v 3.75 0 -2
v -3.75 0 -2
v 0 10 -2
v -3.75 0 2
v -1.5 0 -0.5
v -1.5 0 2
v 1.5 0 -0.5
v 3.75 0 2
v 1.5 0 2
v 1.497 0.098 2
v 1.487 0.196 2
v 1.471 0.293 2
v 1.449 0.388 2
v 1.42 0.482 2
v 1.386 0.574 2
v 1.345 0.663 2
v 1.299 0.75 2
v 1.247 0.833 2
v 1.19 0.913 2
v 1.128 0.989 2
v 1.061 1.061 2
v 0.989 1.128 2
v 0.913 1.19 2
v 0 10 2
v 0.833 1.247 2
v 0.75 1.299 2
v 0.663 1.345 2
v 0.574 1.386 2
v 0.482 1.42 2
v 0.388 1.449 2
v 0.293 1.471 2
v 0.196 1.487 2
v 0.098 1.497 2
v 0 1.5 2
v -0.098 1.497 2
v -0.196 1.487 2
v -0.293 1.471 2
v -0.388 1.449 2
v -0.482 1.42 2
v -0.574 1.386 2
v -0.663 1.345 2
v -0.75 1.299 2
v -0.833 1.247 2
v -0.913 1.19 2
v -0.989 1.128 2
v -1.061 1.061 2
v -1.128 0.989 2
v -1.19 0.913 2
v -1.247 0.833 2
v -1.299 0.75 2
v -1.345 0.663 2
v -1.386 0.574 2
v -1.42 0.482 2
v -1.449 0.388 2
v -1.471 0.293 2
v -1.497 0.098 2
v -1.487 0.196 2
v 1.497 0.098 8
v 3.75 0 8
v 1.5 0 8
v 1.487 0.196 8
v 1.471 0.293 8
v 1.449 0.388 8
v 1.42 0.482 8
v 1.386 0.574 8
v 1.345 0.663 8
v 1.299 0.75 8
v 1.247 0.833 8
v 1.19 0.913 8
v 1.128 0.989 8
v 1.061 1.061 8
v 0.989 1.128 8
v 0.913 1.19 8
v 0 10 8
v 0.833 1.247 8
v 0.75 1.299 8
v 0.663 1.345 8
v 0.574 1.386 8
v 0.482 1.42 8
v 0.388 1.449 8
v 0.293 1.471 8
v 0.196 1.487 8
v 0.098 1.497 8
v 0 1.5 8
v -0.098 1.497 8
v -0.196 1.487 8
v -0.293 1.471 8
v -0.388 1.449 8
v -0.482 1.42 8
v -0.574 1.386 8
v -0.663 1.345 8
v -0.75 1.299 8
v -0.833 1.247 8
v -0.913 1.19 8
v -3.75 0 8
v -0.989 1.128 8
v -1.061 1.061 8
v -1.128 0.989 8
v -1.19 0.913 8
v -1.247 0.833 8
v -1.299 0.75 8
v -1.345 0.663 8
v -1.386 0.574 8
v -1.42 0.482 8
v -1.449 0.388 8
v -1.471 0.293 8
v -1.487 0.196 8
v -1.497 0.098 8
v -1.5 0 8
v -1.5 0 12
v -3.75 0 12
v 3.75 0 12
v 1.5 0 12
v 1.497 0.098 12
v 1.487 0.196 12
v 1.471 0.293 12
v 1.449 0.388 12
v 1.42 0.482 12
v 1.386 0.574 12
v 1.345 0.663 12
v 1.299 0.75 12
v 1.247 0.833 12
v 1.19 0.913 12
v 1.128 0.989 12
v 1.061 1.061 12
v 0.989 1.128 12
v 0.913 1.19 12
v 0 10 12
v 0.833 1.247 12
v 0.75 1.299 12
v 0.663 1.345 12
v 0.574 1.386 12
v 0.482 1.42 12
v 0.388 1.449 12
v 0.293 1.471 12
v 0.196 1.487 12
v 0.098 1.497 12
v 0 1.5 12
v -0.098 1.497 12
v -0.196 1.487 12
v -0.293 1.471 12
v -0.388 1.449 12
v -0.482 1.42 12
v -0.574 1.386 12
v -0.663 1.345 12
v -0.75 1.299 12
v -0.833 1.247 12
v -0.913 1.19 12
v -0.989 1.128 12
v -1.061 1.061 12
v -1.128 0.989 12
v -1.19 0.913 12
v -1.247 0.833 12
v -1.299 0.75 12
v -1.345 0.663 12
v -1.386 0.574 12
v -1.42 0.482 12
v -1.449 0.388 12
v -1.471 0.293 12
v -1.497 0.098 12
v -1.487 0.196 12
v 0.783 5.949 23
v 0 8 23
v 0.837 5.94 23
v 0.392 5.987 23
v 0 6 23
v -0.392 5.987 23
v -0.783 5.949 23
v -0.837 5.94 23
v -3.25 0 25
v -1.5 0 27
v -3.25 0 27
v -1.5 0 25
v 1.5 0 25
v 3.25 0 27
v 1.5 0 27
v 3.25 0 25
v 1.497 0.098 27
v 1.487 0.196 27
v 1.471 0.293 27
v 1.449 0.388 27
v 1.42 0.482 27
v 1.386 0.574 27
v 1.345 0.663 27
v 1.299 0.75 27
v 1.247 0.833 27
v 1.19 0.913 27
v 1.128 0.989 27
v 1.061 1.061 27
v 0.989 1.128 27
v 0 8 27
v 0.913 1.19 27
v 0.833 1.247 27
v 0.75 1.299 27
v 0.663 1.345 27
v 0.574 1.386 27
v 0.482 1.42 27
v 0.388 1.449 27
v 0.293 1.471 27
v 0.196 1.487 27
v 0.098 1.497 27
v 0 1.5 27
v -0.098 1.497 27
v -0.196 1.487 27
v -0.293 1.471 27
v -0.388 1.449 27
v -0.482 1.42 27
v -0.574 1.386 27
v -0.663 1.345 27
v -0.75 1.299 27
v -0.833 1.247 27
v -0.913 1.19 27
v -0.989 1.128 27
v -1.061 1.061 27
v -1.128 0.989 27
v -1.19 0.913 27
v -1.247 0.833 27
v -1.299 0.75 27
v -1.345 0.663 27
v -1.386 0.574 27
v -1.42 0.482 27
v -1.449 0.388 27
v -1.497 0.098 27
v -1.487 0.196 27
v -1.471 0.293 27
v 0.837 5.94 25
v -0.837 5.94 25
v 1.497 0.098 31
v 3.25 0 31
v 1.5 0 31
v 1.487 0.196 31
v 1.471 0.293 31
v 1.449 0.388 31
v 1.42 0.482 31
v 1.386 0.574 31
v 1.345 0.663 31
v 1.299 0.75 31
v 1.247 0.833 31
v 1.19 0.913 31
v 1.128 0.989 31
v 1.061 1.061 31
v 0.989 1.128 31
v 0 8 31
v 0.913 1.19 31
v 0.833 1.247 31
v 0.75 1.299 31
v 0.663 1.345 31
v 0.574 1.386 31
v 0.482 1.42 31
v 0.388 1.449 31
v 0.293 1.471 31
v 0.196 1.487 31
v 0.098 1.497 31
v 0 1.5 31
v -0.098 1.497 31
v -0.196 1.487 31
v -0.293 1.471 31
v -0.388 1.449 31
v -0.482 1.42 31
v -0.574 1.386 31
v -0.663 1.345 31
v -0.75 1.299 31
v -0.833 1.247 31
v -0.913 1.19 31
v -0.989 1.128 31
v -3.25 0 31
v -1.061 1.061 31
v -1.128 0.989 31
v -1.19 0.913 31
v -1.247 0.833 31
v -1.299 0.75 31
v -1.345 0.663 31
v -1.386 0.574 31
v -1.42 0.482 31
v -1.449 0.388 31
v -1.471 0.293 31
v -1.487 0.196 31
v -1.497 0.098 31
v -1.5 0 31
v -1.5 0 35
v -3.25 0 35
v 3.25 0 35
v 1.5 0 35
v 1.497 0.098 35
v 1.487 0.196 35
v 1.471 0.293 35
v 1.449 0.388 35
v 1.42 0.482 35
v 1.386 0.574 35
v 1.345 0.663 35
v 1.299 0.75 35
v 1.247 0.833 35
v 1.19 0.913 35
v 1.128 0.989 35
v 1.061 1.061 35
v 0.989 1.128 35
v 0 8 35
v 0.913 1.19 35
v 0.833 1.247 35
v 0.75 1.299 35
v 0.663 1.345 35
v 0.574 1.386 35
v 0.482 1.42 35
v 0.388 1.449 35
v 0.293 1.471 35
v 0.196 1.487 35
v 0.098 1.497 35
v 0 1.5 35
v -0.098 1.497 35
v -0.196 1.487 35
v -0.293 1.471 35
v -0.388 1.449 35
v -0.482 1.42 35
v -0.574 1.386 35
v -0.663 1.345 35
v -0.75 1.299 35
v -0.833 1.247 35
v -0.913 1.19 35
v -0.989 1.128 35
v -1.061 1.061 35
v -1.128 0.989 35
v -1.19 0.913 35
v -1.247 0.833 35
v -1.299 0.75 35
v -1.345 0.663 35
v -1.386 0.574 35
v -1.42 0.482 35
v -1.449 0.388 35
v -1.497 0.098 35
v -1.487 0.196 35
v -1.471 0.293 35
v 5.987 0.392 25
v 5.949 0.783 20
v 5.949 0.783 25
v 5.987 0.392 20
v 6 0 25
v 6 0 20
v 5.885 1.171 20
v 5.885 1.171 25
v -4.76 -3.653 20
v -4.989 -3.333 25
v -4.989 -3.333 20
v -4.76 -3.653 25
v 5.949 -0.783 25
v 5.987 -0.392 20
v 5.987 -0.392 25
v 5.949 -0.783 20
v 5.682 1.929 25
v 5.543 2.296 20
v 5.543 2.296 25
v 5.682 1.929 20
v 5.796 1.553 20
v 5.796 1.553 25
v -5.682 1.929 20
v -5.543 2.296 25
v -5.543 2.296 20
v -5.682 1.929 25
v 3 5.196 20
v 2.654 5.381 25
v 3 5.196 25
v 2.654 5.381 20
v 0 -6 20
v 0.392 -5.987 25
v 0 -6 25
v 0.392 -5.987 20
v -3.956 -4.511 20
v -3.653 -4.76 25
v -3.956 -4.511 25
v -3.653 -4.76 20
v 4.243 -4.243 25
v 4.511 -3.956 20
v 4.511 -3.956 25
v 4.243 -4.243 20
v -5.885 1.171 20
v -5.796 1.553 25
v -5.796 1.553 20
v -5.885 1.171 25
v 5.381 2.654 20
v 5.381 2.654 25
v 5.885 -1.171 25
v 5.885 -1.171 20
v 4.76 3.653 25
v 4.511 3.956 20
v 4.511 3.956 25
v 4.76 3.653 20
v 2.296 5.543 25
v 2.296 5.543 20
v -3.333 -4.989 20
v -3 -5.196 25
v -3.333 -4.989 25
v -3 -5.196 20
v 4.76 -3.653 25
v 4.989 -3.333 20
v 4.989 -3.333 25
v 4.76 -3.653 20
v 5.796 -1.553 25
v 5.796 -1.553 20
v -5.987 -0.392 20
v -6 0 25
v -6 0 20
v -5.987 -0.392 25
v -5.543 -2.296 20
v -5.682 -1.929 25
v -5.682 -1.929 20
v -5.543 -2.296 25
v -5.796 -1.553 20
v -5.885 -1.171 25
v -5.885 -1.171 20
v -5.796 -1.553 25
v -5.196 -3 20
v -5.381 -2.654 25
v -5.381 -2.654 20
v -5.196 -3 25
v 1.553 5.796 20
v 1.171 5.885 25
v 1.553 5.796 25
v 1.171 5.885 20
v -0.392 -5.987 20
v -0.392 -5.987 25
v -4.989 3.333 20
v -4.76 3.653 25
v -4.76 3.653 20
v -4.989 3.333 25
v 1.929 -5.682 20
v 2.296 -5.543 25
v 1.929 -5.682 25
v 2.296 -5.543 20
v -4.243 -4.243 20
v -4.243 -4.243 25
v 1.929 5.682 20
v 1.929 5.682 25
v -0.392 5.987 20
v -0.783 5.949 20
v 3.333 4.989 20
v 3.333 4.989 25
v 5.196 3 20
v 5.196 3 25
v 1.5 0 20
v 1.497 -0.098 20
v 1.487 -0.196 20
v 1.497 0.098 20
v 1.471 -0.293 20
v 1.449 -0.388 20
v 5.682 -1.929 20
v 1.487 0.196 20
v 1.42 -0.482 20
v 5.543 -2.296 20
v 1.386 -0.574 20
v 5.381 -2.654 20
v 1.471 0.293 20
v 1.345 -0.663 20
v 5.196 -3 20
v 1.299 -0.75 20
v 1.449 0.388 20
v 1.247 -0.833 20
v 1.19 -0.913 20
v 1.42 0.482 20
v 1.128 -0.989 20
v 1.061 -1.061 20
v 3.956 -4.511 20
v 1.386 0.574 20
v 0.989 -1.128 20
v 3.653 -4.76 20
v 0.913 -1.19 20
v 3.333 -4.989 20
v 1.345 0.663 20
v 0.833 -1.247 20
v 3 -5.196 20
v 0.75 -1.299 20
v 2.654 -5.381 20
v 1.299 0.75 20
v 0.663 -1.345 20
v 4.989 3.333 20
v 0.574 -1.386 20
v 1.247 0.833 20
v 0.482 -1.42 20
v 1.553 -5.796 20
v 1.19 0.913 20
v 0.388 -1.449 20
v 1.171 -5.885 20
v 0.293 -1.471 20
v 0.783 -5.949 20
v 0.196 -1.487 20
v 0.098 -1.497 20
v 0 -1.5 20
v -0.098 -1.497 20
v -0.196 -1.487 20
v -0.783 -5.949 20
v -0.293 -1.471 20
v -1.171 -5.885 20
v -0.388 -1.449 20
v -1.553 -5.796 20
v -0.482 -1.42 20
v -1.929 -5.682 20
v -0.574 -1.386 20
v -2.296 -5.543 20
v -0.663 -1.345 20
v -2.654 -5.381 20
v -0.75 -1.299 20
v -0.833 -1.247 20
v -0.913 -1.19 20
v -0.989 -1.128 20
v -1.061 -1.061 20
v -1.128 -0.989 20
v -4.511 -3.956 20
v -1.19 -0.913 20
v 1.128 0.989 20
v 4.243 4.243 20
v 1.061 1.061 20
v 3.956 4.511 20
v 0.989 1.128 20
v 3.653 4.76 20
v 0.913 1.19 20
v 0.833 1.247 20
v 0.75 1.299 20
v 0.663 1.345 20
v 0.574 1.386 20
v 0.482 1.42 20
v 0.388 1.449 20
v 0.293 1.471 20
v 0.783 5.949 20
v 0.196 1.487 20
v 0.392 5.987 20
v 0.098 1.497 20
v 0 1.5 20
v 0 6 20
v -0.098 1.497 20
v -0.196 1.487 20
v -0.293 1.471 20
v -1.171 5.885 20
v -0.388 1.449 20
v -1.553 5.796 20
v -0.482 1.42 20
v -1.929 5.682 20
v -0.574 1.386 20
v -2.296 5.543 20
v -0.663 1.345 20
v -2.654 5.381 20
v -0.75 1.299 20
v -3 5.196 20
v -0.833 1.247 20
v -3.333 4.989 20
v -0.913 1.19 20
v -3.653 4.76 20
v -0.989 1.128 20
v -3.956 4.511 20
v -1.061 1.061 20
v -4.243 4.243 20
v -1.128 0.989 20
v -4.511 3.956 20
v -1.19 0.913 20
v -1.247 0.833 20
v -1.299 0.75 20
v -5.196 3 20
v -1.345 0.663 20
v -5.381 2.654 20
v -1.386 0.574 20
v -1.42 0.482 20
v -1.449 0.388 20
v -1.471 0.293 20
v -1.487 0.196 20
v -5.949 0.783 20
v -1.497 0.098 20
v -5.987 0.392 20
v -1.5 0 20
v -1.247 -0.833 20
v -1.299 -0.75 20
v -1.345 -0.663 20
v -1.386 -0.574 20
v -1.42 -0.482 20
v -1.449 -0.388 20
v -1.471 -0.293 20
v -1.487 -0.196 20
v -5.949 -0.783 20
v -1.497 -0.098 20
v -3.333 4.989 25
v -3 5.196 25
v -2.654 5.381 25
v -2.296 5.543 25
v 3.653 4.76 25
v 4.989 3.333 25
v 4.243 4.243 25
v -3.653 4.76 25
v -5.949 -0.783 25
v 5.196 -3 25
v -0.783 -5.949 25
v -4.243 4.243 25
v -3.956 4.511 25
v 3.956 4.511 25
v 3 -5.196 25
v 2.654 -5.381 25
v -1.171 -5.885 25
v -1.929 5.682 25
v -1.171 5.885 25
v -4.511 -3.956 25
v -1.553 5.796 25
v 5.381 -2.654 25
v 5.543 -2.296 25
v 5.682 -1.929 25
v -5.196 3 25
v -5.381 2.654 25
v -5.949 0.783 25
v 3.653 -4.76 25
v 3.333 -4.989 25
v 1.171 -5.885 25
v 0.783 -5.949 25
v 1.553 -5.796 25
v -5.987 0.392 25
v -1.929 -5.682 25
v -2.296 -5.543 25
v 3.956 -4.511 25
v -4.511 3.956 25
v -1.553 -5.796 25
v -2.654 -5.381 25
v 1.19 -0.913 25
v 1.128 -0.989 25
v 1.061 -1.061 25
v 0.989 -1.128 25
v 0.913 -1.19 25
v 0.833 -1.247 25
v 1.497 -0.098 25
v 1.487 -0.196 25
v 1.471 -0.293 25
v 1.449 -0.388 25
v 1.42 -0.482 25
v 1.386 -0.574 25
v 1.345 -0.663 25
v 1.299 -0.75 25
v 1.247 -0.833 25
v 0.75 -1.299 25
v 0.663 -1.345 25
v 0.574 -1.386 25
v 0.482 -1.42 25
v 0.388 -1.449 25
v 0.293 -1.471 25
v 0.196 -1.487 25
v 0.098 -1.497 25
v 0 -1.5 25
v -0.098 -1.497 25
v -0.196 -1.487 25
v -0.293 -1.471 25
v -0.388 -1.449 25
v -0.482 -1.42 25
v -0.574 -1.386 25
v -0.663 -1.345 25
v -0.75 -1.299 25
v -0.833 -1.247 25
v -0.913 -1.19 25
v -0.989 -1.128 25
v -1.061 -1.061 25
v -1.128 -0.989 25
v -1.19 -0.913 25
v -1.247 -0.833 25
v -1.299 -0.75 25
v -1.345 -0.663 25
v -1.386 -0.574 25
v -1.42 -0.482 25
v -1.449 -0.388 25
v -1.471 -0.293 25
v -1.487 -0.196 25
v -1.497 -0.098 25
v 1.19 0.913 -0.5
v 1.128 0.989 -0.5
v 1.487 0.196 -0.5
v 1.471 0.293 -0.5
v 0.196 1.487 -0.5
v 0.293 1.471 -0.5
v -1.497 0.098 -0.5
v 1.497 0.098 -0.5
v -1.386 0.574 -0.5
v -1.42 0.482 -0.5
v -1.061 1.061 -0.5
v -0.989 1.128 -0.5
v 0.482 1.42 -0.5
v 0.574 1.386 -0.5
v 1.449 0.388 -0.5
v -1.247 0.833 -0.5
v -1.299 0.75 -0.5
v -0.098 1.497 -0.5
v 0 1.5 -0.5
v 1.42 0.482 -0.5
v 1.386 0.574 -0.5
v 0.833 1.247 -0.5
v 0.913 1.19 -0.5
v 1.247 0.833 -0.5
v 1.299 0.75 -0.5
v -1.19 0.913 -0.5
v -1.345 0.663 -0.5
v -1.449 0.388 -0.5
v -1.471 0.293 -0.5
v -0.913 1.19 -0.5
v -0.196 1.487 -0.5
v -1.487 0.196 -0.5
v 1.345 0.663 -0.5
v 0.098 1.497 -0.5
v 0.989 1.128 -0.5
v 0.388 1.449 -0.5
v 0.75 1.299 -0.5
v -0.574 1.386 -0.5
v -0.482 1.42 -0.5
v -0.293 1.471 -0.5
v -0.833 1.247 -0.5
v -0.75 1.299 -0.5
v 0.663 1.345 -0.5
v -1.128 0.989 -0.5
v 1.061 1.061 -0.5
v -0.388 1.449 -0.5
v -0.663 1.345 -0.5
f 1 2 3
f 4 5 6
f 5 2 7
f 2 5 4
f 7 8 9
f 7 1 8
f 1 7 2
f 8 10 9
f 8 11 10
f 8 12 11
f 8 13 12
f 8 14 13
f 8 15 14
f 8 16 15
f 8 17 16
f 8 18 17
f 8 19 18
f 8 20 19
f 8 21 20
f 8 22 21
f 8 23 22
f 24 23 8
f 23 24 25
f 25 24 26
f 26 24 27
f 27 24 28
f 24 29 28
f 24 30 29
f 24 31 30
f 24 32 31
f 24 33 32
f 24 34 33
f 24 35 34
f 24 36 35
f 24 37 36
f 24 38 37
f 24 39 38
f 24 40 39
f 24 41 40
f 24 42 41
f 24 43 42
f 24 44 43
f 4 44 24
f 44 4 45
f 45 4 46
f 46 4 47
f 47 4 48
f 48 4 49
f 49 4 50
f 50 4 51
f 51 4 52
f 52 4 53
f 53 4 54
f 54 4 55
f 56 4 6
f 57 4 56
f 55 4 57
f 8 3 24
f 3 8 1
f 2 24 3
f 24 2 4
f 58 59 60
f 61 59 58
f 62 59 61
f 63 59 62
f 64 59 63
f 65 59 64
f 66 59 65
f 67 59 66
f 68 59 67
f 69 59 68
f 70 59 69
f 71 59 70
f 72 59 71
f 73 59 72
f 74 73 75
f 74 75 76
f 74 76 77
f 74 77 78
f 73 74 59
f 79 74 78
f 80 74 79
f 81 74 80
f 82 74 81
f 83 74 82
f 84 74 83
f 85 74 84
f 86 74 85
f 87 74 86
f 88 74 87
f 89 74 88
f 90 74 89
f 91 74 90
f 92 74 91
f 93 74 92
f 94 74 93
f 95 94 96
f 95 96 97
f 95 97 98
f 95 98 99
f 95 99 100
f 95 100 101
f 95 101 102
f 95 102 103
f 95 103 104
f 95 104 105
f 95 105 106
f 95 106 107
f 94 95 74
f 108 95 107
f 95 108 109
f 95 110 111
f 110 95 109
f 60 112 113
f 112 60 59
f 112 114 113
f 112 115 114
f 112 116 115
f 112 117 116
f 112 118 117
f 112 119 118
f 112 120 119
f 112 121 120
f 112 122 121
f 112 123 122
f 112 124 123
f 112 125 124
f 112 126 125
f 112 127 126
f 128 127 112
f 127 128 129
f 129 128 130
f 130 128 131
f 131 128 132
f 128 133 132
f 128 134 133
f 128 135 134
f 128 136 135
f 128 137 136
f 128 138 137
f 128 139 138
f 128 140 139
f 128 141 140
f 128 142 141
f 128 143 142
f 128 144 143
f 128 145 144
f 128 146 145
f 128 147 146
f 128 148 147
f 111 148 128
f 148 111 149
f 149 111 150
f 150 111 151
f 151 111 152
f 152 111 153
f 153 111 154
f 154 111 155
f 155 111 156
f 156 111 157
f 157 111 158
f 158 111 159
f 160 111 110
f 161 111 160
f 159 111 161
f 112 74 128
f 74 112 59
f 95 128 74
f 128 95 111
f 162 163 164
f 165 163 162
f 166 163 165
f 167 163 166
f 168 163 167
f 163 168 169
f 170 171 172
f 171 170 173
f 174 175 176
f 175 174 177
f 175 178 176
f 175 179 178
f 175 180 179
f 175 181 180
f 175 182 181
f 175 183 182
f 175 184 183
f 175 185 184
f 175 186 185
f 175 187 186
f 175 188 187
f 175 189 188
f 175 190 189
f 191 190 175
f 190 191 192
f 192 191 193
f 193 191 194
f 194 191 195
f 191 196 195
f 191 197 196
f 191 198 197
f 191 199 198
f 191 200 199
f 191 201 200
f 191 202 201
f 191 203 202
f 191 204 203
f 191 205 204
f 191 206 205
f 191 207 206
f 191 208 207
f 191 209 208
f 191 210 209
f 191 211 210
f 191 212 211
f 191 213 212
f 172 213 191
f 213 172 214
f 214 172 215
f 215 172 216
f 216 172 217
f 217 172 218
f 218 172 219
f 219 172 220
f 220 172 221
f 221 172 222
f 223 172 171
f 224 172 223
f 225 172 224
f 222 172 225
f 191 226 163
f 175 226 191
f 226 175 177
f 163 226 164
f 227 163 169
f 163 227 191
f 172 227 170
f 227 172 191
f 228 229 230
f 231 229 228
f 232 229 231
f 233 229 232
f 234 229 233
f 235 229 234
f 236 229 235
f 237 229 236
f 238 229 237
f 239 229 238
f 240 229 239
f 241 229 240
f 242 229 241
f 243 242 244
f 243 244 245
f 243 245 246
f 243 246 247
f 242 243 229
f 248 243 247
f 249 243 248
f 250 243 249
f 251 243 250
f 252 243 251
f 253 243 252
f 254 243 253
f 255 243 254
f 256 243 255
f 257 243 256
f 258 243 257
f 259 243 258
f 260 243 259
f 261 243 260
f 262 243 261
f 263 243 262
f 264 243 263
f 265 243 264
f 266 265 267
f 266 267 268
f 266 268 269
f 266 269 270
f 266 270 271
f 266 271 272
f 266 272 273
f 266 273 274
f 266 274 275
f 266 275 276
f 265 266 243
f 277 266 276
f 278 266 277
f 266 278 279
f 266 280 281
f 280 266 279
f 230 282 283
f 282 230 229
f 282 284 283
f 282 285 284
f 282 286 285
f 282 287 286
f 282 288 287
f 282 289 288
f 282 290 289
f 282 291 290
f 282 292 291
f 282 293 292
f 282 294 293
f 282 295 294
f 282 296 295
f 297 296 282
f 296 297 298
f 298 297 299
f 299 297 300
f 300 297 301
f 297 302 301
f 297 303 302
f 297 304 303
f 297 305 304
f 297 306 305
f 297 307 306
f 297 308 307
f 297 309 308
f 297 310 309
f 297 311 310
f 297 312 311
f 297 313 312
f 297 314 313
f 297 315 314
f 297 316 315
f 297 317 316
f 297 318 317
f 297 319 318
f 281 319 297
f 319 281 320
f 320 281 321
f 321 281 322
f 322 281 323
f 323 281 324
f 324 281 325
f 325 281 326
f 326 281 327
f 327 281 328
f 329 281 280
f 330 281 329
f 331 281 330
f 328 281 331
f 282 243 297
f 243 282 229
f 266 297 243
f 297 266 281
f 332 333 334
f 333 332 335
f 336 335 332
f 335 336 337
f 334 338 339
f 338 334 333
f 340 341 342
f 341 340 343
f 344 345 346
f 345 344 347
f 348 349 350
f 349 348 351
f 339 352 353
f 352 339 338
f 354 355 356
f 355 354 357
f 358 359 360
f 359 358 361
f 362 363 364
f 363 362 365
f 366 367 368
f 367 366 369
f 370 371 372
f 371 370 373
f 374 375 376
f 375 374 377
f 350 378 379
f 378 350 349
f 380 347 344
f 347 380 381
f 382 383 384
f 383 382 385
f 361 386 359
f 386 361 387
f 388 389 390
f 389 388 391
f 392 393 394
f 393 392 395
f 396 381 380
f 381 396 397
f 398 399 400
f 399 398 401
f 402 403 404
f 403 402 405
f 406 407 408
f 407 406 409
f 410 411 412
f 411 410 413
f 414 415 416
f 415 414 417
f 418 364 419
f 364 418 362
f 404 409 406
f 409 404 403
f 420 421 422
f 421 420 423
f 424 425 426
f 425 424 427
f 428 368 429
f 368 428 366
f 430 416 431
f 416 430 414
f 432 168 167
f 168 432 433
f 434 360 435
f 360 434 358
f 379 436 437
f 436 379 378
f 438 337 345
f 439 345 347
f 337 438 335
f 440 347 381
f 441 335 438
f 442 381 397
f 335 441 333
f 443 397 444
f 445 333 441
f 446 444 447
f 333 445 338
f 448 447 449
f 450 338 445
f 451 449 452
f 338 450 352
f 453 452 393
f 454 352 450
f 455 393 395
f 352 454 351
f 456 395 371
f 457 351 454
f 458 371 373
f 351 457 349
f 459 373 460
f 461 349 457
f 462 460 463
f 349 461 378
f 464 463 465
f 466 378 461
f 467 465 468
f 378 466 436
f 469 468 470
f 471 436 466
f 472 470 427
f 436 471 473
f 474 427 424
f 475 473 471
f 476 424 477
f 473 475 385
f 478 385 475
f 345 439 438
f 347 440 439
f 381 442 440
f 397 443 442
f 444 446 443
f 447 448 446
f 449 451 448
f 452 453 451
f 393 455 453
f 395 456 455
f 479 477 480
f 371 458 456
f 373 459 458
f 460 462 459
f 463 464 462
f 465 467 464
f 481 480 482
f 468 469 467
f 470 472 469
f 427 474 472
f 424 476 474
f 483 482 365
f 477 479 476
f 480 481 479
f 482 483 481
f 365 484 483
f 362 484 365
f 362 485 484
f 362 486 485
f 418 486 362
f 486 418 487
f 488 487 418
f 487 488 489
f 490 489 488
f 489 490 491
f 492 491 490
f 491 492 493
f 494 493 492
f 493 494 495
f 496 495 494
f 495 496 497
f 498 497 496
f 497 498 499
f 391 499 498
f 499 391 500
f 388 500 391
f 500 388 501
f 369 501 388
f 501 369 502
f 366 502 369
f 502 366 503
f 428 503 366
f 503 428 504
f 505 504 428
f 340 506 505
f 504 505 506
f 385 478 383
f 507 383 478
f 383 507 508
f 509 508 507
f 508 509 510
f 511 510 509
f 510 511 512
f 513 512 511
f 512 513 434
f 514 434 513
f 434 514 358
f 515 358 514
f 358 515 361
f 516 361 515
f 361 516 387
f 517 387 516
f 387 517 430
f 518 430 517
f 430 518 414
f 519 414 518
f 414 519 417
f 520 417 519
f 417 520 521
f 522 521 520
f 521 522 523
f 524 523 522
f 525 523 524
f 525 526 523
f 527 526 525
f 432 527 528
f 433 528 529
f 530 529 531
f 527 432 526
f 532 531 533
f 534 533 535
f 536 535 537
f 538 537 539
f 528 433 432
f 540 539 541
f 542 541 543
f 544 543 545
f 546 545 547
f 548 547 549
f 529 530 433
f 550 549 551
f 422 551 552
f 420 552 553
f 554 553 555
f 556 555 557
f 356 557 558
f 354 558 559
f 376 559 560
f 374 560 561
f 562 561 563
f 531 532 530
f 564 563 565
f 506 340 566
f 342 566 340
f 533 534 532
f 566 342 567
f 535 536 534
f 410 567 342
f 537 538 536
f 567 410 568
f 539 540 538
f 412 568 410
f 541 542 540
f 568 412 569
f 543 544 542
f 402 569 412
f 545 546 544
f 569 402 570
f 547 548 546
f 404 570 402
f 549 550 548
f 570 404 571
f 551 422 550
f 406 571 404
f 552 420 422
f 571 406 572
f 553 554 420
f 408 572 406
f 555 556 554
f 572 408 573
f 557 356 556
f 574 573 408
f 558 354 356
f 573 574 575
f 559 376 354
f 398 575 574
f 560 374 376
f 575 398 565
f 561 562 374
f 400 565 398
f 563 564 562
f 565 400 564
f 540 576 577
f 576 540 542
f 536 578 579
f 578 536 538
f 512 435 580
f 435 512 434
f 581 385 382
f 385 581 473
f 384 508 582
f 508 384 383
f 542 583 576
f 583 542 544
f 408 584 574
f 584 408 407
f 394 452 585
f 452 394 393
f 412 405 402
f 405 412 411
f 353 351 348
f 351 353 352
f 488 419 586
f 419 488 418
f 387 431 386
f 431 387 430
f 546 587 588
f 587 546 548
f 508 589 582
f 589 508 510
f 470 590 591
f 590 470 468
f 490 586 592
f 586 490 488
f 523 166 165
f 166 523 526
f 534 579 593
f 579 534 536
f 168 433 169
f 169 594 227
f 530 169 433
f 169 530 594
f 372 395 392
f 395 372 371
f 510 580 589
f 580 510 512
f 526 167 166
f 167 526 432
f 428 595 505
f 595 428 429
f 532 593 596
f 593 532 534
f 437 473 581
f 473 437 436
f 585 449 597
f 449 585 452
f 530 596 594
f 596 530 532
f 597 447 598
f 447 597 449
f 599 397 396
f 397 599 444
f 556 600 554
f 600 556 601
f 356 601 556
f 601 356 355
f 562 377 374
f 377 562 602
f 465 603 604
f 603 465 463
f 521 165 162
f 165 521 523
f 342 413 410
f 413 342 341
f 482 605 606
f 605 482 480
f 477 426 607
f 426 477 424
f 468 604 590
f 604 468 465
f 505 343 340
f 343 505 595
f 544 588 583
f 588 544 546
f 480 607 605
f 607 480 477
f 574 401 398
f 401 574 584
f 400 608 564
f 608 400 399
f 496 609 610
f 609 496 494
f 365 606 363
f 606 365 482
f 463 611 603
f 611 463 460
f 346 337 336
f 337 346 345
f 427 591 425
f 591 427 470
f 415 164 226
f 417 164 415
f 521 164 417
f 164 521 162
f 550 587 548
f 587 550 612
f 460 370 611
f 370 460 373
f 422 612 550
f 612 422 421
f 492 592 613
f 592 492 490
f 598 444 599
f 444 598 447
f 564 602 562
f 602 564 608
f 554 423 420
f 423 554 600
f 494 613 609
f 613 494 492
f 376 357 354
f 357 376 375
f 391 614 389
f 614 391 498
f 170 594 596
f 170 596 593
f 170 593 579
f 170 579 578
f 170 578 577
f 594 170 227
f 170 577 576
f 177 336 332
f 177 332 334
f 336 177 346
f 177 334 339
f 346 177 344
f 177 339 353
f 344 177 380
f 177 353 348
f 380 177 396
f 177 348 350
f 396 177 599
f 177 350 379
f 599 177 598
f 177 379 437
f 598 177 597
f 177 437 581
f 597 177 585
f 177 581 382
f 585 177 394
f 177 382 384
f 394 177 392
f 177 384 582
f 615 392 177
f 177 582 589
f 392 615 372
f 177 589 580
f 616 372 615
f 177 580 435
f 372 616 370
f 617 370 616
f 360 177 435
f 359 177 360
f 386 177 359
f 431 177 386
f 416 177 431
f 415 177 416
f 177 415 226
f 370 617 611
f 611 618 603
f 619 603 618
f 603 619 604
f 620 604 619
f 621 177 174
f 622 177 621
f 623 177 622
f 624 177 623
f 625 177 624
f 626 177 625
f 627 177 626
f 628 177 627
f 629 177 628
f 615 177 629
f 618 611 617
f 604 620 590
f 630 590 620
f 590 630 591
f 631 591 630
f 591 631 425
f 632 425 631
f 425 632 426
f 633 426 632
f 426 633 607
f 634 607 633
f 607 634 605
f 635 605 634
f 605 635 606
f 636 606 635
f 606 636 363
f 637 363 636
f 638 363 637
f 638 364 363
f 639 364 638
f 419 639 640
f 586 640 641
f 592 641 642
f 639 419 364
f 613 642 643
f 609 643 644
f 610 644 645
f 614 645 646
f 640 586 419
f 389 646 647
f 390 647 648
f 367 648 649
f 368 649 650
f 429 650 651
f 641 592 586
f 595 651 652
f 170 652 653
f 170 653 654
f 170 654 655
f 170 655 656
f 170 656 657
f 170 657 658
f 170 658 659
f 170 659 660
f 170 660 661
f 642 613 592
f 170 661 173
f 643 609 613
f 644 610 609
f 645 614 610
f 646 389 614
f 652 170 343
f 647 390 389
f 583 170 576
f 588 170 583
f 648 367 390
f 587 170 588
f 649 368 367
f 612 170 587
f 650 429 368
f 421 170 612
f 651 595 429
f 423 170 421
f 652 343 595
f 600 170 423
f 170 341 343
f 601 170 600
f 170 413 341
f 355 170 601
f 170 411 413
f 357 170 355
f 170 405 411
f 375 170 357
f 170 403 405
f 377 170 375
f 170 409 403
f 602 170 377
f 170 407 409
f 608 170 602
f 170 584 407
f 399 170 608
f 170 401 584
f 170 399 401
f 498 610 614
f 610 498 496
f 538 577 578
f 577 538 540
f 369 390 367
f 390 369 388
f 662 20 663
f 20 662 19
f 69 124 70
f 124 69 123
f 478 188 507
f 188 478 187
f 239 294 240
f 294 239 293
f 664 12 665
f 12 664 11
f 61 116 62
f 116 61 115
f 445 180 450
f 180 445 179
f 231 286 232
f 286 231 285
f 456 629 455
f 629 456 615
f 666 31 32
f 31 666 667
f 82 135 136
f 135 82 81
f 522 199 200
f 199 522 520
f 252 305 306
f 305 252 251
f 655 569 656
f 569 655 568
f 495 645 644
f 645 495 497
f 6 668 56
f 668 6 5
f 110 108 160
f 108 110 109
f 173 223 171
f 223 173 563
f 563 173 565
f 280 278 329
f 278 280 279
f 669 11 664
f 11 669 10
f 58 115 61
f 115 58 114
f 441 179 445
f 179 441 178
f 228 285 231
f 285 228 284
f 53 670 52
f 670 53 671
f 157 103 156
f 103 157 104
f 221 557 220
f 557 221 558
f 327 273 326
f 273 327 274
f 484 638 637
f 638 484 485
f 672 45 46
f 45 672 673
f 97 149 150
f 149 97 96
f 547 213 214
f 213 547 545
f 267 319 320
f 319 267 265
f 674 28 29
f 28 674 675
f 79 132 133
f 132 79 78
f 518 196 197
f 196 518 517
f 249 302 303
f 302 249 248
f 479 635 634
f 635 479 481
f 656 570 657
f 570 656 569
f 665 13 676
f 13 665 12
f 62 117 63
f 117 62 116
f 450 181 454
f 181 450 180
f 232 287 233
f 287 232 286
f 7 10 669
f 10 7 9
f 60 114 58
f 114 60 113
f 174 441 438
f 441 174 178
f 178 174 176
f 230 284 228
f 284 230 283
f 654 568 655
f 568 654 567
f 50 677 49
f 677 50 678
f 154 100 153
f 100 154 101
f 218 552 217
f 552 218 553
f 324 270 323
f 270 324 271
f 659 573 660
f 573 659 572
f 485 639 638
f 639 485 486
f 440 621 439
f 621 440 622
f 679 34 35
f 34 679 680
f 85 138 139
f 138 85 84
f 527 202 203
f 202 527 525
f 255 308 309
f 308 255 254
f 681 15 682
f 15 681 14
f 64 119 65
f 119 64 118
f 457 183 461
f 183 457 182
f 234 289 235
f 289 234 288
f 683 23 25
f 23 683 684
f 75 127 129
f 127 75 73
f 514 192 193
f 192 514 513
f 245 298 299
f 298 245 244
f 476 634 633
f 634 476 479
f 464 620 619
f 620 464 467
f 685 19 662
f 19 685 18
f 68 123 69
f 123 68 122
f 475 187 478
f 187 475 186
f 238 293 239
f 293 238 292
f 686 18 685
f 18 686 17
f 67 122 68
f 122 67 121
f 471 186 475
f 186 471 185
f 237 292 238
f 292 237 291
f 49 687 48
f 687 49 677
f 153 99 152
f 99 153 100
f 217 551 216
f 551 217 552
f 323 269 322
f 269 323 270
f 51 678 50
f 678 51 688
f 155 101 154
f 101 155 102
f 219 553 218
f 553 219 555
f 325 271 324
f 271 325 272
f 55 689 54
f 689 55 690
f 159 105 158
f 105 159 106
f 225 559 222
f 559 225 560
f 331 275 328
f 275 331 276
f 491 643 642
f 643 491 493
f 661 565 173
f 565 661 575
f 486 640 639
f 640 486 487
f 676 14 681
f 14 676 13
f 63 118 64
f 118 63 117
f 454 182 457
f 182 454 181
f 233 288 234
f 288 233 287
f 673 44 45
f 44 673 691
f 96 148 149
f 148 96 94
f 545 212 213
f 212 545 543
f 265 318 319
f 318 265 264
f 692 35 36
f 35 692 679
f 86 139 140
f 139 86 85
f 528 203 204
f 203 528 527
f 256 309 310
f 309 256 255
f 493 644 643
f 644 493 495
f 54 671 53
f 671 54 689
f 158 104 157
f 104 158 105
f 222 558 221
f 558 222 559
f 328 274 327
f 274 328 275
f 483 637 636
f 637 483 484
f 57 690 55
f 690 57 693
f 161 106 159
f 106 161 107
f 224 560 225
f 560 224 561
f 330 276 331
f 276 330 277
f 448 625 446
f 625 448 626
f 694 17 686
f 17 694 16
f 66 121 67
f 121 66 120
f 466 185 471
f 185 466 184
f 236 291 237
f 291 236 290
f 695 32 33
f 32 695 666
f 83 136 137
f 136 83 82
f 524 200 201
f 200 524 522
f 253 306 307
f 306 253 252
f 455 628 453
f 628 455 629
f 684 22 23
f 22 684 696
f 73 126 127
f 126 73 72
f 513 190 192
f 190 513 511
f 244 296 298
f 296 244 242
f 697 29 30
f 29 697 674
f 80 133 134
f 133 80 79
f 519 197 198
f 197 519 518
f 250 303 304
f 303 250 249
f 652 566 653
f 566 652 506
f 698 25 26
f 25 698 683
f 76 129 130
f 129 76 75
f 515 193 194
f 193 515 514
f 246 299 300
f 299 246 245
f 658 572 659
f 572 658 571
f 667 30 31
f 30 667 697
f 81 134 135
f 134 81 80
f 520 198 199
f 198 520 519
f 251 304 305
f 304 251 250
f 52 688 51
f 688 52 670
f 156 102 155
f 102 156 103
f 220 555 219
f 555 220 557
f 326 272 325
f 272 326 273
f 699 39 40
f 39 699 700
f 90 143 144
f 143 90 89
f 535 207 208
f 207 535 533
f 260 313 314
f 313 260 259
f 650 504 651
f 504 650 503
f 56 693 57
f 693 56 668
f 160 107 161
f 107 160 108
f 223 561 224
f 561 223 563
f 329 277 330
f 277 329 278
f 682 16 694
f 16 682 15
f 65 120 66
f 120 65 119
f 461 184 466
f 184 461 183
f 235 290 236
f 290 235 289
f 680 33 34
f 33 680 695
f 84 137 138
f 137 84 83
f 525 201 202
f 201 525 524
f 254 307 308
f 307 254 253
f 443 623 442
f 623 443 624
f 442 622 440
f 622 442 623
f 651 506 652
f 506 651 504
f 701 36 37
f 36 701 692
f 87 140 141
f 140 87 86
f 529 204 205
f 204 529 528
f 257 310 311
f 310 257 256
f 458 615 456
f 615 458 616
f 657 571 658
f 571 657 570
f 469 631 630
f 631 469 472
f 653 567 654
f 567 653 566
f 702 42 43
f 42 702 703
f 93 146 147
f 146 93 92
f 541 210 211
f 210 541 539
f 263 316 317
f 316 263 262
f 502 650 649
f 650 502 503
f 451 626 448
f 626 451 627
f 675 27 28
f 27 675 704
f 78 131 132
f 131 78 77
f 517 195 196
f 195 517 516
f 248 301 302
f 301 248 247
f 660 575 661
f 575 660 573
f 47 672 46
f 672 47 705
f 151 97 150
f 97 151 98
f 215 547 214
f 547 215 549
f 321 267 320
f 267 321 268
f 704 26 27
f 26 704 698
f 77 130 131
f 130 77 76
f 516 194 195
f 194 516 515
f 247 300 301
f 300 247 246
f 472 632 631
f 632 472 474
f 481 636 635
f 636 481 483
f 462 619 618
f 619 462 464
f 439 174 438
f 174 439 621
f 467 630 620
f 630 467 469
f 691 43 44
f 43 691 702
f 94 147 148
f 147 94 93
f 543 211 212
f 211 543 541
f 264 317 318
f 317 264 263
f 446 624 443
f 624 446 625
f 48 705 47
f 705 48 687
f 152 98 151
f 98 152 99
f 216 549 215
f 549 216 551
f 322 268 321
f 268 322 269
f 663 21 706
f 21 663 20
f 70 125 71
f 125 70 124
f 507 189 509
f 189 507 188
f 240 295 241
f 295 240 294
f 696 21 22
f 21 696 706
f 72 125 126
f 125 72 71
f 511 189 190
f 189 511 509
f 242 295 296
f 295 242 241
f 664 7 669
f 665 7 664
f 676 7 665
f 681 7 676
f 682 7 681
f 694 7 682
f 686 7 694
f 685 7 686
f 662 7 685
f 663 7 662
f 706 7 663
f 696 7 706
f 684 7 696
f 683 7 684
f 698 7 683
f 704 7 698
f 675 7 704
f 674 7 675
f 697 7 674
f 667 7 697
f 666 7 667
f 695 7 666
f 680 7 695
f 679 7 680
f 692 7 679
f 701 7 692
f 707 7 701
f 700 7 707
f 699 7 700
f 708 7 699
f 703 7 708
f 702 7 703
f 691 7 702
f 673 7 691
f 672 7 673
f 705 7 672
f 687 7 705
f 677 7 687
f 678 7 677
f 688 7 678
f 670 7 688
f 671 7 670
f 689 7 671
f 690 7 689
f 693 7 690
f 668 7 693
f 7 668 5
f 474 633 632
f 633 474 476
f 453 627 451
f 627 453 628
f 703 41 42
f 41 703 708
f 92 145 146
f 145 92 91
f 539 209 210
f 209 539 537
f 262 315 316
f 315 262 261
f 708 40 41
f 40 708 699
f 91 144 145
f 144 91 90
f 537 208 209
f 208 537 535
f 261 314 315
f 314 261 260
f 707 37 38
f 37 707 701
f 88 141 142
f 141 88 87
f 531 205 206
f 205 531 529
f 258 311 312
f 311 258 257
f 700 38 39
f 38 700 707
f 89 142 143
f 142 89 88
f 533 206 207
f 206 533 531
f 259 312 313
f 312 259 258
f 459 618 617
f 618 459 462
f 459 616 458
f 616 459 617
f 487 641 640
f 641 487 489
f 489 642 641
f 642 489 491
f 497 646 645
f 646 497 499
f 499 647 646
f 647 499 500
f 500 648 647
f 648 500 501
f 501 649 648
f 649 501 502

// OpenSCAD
// Hose-barb reducer: joins 8 mm ID tubing to 5 mm ID tubing
// Print orientation: standing upright along +Z, centred on origin in X/Y

$fn = 96;

// ---- Dimensions (mm) ----
eps      = 0.5;         // overcut for clean differences
barb_h8  = 10;          // height of each 8 mm barb
barb_od8_bottom = 7.5;  // outer diameter of 8 mm barb at bottom
barb_od8_top    = 9.5;  // outer diameter of 8 mm barb at top
collar_d      = 12;     // diameter of the collar
barb_h5  = 8;           // height of each 5 mm barb
barb_od5_bottom = 6.5;  // outer diameter of 5 mm barb at bottom
barb_od5_top    = 5.0;  // outer diameter of 5 mm barb at top
bore_d      = 3;        // central through-bore diameter
length8     = 20;       // z extent of the 8 mm tubing section
length5     = 16;       // z extent of the 5 mm tubing section (z = 25 to 41)
length_coll = 5;        // z extent of the collar (z = 20 to 25)

// ---- Model ----
difference() {
    union() {
        // 8 mm tubing section: two stacked barbs with sawtooth profile
        for (i = [0 : 1])
            translate([0, 0, i * barb_h8])
                linear_extrude(height = bore_d + 2 * eps, center = true)
                    polygon([
                        [-barb_od8_bottom / 2, 0],
                        [ barb_od8_bottom / 2, 0],
                        [0, barb_h8],
                        [-0, barb_h8]
                    ]);
        // collar
        translate([0, 0, length8])
            cylinder(d = collar_d, h = length_coll);
        // 5 mm tubing section: two stacked barbs, shrinking OD
        for (i = [0 : 1])
            translate([0, 0, length8 + length_coll + i * barb_h5])
                linear_extrude(height = bore_d + 2 * eps, center = true)
                    polygon([
                        [-barb_od5_bottom / 2, 0],
                        [ barb_od5_bottom / 2, 0],
                        [0, barb_h5],
                        [-0, barb_h5]
                    ]);
    }
    // central through-bore
    translate([0, 0, -eps])
        cylinder(d = bore_d, h = length8 + length_coll + 2 * barb_h5 + 2 * eps);
}
